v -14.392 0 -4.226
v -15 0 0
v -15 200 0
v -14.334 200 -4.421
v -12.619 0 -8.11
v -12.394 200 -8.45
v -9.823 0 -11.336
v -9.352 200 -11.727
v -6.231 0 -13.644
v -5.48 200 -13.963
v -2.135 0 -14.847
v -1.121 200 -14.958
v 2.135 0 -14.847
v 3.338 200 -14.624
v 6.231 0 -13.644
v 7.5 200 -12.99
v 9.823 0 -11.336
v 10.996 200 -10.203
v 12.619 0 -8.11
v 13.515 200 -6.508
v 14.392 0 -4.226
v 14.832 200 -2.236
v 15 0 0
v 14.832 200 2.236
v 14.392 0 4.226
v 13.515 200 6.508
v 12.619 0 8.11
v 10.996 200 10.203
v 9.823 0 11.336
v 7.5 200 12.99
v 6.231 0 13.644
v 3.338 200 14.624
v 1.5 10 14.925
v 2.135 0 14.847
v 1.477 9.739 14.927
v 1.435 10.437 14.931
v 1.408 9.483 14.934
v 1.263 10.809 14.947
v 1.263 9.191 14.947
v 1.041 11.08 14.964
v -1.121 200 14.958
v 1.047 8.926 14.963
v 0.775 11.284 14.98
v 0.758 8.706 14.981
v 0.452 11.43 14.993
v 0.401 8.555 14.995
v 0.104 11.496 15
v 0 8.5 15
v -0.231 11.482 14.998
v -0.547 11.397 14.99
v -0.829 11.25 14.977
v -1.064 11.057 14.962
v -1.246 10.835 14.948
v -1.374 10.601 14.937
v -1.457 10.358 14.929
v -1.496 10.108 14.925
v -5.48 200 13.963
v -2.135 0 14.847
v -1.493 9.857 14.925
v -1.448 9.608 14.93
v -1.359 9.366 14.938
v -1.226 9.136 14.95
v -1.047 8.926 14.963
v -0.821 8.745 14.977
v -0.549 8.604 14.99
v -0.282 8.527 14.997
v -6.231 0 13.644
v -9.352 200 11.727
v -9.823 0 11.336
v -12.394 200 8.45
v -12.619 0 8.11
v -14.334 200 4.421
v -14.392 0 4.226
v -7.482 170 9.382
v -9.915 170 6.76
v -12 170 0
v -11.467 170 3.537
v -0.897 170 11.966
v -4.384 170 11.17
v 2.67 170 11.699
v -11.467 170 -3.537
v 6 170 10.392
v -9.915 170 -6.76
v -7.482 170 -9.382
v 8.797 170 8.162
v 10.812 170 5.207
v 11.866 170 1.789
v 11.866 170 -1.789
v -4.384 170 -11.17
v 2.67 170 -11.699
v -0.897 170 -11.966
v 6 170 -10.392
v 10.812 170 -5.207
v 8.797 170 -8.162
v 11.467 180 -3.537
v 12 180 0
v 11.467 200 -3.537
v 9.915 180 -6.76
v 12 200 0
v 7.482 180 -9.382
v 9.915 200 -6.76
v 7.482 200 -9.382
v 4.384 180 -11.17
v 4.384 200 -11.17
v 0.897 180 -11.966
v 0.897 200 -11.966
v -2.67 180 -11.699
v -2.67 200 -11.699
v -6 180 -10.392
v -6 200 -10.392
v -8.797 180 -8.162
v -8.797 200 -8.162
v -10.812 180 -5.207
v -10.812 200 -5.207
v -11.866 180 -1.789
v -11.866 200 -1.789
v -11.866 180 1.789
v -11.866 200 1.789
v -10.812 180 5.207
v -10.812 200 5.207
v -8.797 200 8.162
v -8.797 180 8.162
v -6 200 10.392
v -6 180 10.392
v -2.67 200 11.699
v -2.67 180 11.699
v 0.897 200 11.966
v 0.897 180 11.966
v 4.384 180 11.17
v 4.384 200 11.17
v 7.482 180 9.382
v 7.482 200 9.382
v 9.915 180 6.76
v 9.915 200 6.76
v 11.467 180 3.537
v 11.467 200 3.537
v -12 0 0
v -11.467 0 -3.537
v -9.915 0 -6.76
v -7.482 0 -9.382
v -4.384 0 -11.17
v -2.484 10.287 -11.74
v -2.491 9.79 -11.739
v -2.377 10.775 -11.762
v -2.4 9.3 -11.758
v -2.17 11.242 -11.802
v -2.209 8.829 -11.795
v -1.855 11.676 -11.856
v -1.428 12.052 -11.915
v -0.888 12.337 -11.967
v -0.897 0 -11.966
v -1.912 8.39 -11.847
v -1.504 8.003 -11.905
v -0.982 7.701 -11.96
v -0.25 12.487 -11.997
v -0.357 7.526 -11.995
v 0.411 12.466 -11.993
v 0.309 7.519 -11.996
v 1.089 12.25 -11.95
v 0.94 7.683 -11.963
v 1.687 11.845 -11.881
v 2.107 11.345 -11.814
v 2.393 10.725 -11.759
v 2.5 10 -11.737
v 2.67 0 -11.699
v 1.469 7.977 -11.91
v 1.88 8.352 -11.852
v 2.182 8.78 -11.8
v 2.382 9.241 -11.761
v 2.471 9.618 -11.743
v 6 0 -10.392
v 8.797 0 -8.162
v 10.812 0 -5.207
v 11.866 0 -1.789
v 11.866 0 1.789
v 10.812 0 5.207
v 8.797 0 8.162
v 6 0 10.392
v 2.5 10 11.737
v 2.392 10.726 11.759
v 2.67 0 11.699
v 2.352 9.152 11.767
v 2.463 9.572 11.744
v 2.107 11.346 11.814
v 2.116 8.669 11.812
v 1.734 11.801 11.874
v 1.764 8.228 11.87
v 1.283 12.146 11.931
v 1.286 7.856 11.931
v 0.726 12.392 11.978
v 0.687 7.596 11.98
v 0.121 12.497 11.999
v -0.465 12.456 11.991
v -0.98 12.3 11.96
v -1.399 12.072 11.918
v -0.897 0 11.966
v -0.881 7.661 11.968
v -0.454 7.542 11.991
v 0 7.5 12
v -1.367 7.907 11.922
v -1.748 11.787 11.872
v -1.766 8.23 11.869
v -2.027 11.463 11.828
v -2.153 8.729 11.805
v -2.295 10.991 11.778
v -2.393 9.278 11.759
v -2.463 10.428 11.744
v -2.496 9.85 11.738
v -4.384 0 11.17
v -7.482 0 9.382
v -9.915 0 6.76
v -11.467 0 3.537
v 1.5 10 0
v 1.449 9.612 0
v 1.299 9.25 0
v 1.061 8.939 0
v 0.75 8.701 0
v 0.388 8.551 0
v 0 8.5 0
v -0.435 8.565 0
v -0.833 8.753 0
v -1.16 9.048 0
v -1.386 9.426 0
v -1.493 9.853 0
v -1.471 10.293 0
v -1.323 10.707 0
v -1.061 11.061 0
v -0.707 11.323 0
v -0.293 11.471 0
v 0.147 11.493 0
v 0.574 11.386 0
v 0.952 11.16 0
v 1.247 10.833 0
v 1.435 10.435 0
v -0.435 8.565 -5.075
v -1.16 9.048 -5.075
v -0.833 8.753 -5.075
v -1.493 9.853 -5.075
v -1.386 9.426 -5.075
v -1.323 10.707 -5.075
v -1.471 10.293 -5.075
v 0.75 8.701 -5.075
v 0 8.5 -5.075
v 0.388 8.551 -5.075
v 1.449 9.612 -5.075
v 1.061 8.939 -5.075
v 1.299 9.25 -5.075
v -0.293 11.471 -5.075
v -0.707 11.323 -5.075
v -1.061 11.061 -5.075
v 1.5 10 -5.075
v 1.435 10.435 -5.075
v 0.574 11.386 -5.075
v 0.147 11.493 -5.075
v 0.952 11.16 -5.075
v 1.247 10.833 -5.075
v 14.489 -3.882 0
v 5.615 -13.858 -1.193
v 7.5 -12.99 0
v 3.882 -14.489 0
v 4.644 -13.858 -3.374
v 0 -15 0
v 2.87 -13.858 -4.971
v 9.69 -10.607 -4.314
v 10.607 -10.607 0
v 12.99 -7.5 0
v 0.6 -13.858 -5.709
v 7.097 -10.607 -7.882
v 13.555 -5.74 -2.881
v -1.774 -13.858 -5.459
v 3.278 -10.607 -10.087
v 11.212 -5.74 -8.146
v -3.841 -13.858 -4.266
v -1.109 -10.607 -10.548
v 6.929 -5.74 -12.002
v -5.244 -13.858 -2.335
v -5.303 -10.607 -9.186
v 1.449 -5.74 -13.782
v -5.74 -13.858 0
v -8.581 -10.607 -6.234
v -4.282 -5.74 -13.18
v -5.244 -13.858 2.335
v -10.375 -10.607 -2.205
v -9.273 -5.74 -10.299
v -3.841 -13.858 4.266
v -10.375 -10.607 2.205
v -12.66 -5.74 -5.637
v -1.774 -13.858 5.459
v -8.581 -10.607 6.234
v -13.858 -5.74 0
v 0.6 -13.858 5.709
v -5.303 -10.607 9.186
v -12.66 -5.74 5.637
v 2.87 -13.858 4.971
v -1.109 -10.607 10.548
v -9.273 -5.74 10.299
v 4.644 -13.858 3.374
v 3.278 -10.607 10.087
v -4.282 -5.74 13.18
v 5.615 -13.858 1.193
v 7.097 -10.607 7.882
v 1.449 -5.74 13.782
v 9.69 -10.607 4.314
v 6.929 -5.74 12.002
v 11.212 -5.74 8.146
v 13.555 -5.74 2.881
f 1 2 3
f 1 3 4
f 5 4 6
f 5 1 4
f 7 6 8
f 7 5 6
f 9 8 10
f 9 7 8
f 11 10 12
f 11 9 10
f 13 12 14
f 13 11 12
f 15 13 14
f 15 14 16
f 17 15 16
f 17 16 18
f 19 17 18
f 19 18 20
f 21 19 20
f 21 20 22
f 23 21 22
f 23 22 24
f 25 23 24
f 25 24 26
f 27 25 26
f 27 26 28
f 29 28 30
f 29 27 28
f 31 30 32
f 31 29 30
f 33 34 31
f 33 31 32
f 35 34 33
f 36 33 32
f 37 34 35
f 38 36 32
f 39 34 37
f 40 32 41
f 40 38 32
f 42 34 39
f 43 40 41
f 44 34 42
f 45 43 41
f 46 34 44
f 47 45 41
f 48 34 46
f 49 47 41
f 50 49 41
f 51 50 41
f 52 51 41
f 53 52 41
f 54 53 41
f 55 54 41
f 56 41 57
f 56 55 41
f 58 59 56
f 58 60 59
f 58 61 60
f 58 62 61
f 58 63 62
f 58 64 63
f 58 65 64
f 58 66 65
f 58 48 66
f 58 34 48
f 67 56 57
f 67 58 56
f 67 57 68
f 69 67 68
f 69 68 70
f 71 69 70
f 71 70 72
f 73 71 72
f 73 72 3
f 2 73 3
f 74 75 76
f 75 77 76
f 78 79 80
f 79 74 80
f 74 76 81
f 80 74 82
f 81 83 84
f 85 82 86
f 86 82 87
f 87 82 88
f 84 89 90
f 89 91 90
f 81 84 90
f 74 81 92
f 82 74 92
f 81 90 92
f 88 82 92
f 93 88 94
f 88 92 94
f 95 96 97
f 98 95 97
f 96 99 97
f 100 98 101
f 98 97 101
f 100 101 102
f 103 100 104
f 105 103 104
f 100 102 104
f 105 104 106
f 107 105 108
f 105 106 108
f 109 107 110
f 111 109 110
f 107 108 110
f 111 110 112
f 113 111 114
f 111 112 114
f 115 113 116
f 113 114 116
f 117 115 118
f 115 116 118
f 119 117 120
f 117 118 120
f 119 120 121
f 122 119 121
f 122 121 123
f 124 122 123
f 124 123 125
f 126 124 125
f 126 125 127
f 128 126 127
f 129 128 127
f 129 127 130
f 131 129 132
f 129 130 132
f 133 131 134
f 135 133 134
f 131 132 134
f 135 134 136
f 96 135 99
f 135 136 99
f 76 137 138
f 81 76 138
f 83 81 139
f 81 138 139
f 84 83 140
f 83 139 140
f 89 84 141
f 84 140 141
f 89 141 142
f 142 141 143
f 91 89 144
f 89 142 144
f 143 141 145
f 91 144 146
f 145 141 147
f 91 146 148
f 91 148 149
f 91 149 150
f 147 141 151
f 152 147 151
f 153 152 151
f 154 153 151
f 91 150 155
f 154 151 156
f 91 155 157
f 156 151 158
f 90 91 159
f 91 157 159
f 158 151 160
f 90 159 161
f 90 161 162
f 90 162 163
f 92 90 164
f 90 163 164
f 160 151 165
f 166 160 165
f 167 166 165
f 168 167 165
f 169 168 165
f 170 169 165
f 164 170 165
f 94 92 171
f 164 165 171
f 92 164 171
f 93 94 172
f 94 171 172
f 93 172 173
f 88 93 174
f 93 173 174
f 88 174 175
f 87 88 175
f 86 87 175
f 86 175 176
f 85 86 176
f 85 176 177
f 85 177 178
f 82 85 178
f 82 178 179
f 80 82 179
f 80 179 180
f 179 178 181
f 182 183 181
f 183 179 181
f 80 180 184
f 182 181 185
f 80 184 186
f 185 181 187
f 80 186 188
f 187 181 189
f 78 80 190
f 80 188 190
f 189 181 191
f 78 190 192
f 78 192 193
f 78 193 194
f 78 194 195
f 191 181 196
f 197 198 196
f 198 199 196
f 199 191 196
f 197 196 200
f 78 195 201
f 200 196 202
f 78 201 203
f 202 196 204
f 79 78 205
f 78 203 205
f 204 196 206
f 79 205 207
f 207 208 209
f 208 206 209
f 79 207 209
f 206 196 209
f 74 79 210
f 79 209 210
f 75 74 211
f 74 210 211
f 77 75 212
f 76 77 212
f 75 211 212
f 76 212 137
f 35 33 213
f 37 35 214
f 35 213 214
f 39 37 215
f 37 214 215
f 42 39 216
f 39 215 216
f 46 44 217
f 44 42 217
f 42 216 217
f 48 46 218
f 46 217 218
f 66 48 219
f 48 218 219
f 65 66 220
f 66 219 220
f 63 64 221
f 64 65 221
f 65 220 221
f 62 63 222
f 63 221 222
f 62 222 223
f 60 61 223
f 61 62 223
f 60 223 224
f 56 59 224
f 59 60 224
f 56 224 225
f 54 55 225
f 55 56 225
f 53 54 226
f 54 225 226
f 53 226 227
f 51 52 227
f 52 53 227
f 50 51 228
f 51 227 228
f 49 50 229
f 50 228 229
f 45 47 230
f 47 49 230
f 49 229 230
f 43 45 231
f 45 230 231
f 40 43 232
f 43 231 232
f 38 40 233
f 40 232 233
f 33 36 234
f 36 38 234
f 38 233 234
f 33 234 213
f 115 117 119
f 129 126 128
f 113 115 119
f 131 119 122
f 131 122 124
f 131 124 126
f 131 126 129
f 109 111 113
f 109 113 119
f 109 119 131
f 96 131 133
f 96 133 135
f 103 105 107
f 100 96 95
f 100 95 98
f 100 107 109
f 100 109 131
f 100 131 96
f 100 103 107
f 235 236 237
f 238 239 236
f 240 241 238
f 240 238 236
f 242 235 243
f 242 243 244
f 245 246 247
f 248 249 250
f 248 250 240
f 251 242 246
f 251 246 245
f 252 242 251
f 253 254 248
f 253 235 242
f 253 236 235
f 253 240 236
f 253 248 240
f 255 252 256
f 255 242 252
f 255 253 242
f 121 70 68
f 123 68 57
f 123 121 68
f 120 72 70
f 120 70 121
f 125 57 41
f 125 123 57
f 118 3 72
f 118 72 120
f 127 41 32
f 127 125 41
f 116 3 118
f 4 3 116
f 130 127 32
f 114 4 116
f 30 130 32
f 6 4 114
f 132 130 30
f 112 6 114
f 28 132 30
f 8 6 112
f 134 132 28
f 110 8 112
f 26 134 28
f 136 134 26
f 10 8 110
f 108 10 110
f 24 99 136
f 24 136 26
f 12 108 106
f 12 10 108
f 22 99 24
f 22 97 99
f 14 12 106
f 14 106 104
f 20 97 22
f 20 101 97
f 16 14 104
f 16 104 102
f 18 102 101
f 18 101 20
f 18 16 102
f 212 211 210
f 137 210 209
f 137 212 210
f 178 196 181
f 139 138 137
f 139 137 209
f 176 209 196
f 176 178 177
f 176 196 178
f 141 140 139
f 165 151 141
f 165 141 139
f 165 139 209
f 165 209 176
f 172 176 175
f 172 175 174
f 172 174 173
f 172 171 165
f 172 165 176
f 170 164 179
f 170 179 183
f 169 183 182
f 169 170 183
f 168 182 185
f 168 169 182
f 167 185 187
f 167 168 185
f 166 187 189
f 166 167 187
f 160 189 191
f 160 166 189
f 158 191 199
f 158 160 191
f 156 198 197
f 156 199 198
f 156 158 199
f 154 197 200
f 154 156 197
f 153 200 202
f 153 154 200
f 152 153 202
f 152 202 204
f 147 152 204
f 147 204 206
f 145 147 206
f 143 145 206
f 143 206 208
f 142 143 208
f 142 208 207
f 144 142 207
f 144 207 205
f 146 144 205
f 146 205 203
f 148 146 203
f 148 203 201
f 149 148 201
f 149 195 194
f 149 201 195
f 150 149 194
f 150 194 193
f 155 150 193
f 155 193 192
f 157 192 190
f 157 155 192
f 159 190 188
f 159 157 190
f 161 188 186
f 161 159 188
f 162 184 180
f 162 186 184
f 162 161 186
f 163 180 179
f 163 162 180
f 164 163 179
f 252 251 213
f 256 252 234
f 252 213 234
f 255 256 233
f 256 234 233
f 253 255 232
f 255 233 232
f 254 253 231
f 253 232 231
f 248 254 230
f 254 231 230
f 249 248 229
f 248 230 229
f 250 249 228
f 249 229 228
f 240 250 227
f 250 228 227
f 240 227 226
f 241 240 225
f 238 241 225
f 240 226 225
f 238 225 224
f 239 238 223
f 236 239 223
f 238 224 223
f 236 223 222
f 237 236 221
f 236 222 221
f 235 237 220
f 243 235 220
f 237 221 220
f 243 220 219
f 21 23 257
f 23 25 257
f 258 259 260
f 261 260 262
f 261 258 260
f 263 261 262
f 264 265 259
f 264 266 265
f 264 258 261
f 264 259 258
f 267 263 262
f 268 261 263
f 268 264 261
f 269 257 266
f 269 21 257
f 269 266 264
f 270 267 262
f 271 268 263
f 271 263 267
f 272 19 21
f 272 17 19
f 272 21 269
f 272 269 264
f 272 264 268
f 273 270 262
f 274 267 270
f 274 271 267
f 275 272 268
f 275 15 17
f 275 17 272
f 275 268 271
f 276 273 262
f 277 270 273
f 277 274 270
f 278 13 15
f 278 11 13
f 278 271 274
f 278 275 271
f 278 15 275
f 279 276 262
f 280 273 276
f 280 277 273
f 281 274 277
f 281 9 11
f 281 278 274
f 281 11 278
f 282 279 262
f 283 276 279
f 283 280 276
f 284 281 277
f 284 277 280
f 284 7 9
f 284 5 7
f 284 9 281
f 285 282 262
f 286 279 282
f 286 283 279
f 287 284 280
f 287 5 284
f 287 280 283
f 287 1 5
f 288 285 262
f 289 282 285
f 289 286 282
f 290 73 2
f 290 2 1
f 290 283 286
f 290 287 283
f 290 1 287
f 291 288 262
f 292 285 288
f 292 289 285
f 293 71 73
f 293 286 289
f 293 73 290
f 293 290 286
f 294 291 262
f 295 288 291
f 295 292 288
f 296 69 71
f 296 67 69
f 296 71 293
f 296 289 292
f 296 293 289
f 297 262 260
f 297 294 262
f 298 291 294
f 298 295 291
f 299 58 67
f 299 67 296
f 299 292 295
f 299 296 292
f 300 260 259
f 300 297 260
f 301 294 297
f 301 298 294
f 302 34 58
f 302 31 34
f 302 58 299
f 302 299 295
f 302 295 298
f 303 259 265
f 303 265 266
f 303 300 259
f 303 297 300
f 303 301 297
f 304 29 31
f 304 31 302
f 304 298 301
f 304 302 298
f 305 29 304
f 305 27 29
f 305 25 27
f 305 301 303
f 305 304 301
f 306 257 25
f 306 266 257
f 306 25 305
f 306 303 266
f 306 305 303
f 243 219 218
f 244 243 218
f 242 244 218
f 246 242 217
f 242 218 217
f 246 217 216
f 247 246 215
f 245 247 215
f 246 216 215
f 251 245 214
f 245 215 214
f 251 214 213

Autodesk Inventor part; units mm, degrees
ref_plane "YZ Plane" through (0, 0, 0) normal (1, 0, 0) x (0, 1, 0)
ref_plane "XZ Plane" through (0, 0, 0) normal (0, 1, 0) x (-1, 0, 0)
ref_plane "XY Plane" through (0, 0, 0) normal (0, 0, 1) x (1, 0, 0)
sketch "Sketch1" plane through (0, 0, 0) normal (0, 1, 0) x (-1, 0, 0)
  circle A0 centre (0, 0) radius 15
  circle A1 centre (0, 0) radius 12
  dimension "d0" = 30
  dimension "d1" = 3
extrude "Extrusion1" add sketch "Sketch1" along normal blind 200
sketch "Sketch2" plane through (0, 0, 0) normal (0, 0, 1) x (1, 0, 0)
  line L0 (0, 0) -> (15, 0)
  line L1 (15, 0) -> (15, -15)
  line L2 (15, -15) -> (0, -15)
  line L3 (0, -15) -> (0, 0)
  line L4 (15, 0) -> (-15, 0) projected
  circle A0 centre (0, 0) radius 15
  dimension "d4" = 15
  dimension "d5" = 15
revolve "Revolution1" add sketch "Sketch2" angle 360 about axis through (0, -15, 0) along (0, 1, 0) contours L0 A0 L3
sketch "Sketch3" plane through (0, 0, 0) normal (0, 0, 1) x (1, 0, 0)
  line L0 (0, 0) -> (0, 10)
  circle A0 centre (0, 10) radius 1.5
  circle A1 centre (0, 10) radius 2.5
  dimension "d7" = 10
  dimension "d8" = 3
  dimension "d9" = 5
extrude "Extrusion2" cut sketch "Sketch3" along normal blind 200 contours A0
extrude "Extrusion3" add sketch "Sketch3" against normal up to surface contours A0 | A1
extrude "Extrusion4" add sketch "Sketch3" along normal up to surface
extrude "Extrusion5" cut sketch "Sketch3" against normal blind 5.075 contours A0
sketch "Sketch4" plane through (0, 200, 0) normal (0, 1, 0) x (1, 0, 0)
  circle A0 centre (0, 0) radius 12
extrude "Extrusion6" add sketch "Sketch4" against normal blind 30
extrude "Extrusion7" cut sketch "Sketch4" against normal blind 20
properties part number "Tube_2"
